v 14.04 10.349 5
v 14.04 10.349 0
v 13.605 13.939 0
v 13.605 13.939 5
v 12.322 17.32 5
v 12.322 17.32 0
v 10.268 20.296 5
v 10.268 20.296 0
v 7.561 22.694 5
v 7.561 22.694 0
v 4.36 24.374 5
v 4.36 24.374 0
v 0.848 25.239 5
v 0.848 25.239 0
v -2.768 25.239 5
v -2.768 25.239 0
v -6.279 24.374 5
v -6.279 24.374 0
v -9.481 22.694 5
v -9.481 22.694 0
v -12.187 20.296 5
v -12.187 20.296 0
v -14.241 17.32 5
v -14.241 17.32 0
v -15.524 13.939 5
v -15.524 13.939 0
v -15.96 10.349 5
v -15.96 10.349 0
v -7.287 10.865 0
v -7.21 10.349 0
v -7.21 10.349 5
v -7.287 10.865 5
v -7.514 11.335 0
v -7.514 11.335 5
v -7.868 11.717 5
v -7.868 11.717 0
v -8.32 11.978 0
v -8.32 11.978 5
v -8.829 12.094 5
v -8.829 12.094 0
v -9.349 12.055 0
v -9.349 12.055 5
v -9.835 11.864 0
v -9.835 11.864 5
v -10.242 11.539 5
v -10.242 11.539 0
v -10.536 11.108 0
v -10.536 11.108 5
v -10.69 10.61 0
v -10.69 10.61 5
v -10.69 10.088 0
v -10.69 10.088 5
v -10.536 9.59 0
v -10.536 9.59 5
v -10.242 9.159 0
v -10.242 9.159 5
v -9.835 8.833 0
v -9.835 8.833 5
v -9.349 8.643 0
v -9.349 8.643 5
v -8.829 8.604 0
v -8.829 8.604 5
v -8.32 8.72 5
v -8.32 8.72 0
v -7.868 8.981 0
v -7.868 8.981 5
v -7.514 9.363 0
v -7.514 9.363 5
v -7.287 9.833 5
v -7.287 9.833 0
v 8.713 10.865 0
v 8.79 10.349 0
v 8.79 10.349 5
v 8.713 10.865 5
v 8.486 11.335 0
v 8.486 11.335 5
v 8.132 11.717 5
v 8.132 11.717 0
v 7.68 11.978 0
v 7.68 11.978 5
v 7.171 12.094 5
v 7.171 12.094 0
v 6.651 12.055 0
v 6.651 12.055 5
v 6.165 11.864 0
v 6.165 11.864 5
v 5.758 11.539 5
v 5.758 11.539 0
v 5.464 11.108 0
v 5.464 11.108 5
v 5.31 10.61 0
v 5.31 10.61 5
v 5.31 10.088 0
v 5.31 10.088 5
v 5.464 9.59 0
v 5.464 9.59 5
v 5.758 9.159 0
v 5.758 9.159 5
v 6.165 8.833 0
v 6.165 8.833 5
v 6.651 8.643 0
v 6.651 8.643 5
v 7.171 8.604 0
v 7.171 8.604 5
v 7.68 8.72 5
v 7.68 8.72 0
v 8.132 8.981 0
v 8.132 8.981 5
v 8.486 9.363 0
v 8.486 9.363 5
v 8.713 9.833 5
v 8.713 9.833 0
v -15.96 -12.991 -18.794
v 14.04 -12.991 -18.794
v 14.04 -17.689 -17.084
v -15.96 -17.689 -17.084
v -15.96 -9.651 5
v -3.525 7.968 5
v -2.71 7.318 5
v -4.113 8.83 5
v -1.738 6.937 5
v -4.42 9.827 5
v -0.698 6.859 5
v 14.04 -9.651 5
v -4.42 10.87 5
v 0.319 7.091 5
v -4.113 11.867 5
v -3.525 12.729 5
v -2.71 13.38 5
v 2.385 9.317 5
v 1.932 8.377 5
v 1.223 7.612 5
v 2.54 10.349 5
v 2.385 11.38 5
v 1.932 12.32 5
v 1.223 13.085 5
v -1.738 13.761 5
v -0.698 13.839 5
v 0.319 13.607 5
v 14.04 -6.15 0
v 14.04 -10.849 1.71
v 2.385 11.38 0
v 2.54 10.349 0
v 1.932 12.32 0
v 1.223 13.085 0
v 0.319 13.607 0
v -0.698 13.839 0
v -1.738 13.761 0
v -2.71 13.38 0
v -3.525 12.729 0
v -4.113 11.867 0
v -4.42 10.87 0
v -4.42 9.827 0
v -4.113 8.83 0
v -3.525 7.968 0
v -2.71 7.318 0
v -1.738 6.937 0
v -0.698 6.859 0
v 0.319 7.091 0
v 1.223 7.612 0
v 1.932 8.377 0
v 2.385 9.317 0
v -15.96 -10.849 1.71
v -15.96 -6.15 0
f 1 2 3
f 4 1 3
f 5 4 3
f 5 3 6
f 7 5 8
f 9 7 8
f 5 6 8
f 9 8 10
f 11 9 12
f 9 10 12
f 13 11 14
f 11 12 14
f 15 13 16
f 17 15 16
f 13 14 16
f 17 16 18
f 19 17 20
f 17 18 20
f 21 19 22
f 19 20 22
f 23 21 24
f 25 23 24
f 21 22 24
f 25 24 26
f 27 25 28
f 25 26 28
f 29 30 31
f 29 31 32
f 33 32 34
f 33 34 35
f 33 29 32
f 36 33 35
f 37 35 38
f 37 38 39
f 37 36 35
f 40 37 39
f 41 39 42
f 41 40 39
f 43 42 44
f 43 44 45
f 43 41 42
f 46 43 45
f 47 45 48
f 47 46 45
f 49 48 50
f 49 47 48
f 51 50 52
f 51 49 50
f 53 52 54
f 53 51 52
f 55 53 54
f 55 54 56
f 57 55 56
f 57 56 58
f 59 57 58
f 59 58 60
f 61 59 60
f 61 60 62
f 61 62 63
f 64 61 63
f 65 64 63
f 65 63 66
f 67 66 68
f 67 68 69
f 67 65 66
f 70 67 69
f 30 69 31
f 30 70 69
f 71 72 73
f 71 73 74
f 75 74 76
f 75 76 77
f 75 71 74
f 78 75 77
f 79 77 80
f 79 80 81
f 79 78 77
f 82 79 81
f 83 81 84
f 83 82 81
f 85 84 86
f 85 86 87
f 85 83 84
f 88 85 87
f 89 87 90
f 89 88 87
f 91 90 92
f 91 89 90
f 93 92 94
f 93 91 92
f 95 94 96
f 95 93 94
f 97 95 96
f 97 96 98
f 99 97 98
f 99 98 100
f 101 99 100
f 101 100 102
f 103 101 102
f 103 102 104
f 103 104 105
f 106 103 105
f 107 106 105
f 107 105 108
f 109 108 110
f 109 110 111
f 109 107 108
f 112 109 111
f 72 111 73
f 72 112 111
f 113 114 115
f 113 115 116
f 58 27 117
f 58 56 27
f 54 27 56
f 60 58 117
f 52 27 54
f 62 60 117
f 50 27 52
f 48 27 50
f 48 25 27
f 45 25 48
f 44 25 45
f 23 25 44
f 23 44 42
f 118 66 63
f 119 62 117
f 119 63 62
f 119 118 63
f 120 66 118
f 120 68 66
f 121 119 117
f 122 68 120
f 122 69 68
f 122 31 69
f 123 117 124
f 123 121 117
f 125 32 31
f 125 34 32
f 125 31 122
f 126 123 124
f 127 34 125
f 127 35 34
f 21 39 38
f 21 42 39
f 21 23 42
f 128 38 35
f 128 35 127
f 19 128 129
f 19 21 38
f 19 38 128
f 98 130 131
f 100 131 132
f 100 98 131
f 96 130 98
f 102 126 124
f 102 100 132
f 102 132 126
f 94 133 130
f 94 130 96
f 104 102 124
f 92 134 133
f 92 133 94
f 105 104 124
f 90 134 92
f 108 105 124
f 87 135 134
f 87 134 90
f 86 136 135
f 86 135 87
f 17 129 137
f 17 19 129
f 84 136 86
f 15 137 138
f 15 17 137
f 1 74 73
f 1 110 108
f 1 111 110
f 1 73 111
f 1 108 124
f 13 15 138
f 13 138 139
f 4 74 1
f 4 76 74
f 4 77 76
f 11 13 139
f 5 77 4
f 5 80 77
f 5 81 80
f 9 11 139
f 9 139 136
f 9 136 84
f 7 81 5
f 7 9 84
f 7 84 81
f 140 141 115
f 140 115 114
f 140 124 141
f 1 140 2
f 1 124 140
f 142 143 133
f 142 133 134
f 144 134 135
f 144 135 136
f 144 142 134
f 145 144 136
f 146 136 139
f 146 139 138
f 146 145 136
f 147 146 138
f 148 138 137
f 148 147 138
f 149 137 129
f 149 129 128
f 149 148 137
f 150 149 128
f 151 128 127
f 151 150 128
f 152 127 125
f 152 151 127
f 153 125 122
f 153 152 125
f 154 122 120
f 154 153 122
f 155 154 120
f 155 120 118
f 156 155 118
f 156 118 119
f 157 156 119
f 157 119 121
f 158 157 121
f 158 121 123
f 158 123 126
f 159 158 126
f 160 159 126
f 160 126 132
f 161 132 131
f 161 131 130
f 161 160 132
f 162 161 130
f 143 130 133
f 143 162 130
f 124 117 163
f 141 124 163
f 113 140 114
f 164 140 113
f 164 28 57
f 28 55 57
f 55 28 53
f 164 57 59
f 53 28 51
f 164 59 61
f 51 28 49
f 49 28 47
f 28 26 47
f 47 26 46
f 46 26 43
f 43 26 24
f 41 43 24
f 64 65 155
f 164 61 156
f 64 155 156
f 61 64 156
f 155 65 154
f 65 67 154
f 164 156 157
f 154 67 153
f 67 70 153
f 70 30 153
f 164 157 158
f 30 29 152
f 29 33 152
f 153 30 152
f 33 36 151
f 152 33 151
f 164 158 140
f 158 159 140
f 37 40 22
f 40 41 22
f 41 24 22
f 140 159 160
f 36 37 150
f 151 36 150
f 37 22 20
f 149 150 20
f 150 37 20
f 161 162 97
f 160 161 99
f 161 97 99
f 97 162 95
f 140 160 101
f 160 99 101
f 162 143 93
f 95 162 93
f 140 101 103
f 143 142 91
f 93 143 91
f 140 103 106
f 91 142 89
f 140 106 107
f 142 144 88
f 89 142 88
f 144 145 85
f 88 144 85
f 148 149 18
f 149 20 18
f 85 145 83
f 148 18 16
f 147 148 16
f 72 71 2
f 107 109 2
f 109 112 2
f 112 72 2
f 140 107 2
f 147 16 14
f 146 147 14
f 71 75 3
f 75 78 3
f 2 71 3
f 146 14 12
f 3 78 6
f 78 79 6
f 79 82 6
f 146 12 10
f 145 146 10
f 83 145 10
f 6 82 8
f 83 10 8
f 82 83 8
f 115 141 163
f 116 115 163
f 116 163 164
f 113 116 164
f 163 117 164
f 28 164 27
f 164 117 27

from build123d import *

# Parameters (mm, degrees)
ESQUISSE1_R             = 1.75
ESQUISSE1_R_2           = 3.5
BOSS_EXTRU_1_DEPTH      = 5
ENL_V_MAT_EXTRU_2_REACH = 41.592
BOSS_EXTRU_2_DEPTH      = 30
ESQUISSE5_W             = 30
ESQUISSE5_H             = 5
BOSS_EXTRU_3_DEPTH      = 20


with BuildPart() as part:
    # Esquisse1 → Boss.-Extru.1 (new body)
    with BuildSketch(Plane.XY):
        with BuildLine():
            Line((-15.959557324, 10.348837209), (-15.959557324, -9.651162791))
            Line((-15.959557324, -9.651162791), (14.040442676, -9.651162791))
            Line((14.040442676, -9.651162791), (14.040442676, 10.348837209))
            ThreePointArc((14.040442676, 10.348837209), (-0.959557324, 25.348837209), (-15.959557324, 10.348837209))
        make_face()
        with Locations((-8.959557324, 10.348837209)):
            Circle(ESQUISSE1_R, mode=Mode.SUBTRACT)
        with Locations((7.040442676, 10.348837209)):
            Circle(ESQUISSE1_R, mode=Mode.SUBTRACT)
        with Locations((-0.959557324, 10.348837209)):
            Circle(ESQUISSE1_R_2, mode=Mode.SUBTRACT)
    extrude(amount=BOSS_EXTRU_1_DEPTH)

    # Esquisse2 → Enlèv. mat.-Extru.2 (cut, up to next)
    with BuildSketch(Plane.ZY.offset(15.959557324), mode=Mode.PRIVATE) as enl_v_mat_extru_2_sk1:
        Polygon((0, -9.651162791), (0, -6.1501251), (1.274273509, -9.651162791), align=None)
    enl_v_mat_extru_2_tool1 = extrude(enl_v_mat_extru_2_sk1.sketch, amount=-ENL_V_MAT_EXTRU_2_REACH, mode=Mode.PRIVATE) & part.part
    add(enl_v_mat_extru_2_tool1.solids().sort_by_distance((-15.959557, -8.48415, 0.424758))[0], mode=Mode.SUBTRACT)

    # Esquisse4 → Boss.-Extru.2 (add)
    with BuildSketch(Plane.ZY.offset(15.959557324)):
        Polygon((5, -9.651162791), (1.710100717, -10.848588204), (1.274273509, -9.651162791), align=None)
    extrude(amount=-BOSS_EXTRU_2_DEPTH)

    # Esquisse5 → Boss.-Extru.3 (add)
    with BuildSketch(Plane(origin=(0, -0.719427971, -1.976612106), x_dir=(-1, 0, 0), z_dir=(0, -0.34202014332566333, -0.9396926207859103))):
        with Locations((0.959557324, -8.279227173)):
            Rectangle(ESQUISSE5_W, ESQUISSE5_H)
    extrude(amount=BOSS_EXTRU_3_DEPTH)


solid = part.part
